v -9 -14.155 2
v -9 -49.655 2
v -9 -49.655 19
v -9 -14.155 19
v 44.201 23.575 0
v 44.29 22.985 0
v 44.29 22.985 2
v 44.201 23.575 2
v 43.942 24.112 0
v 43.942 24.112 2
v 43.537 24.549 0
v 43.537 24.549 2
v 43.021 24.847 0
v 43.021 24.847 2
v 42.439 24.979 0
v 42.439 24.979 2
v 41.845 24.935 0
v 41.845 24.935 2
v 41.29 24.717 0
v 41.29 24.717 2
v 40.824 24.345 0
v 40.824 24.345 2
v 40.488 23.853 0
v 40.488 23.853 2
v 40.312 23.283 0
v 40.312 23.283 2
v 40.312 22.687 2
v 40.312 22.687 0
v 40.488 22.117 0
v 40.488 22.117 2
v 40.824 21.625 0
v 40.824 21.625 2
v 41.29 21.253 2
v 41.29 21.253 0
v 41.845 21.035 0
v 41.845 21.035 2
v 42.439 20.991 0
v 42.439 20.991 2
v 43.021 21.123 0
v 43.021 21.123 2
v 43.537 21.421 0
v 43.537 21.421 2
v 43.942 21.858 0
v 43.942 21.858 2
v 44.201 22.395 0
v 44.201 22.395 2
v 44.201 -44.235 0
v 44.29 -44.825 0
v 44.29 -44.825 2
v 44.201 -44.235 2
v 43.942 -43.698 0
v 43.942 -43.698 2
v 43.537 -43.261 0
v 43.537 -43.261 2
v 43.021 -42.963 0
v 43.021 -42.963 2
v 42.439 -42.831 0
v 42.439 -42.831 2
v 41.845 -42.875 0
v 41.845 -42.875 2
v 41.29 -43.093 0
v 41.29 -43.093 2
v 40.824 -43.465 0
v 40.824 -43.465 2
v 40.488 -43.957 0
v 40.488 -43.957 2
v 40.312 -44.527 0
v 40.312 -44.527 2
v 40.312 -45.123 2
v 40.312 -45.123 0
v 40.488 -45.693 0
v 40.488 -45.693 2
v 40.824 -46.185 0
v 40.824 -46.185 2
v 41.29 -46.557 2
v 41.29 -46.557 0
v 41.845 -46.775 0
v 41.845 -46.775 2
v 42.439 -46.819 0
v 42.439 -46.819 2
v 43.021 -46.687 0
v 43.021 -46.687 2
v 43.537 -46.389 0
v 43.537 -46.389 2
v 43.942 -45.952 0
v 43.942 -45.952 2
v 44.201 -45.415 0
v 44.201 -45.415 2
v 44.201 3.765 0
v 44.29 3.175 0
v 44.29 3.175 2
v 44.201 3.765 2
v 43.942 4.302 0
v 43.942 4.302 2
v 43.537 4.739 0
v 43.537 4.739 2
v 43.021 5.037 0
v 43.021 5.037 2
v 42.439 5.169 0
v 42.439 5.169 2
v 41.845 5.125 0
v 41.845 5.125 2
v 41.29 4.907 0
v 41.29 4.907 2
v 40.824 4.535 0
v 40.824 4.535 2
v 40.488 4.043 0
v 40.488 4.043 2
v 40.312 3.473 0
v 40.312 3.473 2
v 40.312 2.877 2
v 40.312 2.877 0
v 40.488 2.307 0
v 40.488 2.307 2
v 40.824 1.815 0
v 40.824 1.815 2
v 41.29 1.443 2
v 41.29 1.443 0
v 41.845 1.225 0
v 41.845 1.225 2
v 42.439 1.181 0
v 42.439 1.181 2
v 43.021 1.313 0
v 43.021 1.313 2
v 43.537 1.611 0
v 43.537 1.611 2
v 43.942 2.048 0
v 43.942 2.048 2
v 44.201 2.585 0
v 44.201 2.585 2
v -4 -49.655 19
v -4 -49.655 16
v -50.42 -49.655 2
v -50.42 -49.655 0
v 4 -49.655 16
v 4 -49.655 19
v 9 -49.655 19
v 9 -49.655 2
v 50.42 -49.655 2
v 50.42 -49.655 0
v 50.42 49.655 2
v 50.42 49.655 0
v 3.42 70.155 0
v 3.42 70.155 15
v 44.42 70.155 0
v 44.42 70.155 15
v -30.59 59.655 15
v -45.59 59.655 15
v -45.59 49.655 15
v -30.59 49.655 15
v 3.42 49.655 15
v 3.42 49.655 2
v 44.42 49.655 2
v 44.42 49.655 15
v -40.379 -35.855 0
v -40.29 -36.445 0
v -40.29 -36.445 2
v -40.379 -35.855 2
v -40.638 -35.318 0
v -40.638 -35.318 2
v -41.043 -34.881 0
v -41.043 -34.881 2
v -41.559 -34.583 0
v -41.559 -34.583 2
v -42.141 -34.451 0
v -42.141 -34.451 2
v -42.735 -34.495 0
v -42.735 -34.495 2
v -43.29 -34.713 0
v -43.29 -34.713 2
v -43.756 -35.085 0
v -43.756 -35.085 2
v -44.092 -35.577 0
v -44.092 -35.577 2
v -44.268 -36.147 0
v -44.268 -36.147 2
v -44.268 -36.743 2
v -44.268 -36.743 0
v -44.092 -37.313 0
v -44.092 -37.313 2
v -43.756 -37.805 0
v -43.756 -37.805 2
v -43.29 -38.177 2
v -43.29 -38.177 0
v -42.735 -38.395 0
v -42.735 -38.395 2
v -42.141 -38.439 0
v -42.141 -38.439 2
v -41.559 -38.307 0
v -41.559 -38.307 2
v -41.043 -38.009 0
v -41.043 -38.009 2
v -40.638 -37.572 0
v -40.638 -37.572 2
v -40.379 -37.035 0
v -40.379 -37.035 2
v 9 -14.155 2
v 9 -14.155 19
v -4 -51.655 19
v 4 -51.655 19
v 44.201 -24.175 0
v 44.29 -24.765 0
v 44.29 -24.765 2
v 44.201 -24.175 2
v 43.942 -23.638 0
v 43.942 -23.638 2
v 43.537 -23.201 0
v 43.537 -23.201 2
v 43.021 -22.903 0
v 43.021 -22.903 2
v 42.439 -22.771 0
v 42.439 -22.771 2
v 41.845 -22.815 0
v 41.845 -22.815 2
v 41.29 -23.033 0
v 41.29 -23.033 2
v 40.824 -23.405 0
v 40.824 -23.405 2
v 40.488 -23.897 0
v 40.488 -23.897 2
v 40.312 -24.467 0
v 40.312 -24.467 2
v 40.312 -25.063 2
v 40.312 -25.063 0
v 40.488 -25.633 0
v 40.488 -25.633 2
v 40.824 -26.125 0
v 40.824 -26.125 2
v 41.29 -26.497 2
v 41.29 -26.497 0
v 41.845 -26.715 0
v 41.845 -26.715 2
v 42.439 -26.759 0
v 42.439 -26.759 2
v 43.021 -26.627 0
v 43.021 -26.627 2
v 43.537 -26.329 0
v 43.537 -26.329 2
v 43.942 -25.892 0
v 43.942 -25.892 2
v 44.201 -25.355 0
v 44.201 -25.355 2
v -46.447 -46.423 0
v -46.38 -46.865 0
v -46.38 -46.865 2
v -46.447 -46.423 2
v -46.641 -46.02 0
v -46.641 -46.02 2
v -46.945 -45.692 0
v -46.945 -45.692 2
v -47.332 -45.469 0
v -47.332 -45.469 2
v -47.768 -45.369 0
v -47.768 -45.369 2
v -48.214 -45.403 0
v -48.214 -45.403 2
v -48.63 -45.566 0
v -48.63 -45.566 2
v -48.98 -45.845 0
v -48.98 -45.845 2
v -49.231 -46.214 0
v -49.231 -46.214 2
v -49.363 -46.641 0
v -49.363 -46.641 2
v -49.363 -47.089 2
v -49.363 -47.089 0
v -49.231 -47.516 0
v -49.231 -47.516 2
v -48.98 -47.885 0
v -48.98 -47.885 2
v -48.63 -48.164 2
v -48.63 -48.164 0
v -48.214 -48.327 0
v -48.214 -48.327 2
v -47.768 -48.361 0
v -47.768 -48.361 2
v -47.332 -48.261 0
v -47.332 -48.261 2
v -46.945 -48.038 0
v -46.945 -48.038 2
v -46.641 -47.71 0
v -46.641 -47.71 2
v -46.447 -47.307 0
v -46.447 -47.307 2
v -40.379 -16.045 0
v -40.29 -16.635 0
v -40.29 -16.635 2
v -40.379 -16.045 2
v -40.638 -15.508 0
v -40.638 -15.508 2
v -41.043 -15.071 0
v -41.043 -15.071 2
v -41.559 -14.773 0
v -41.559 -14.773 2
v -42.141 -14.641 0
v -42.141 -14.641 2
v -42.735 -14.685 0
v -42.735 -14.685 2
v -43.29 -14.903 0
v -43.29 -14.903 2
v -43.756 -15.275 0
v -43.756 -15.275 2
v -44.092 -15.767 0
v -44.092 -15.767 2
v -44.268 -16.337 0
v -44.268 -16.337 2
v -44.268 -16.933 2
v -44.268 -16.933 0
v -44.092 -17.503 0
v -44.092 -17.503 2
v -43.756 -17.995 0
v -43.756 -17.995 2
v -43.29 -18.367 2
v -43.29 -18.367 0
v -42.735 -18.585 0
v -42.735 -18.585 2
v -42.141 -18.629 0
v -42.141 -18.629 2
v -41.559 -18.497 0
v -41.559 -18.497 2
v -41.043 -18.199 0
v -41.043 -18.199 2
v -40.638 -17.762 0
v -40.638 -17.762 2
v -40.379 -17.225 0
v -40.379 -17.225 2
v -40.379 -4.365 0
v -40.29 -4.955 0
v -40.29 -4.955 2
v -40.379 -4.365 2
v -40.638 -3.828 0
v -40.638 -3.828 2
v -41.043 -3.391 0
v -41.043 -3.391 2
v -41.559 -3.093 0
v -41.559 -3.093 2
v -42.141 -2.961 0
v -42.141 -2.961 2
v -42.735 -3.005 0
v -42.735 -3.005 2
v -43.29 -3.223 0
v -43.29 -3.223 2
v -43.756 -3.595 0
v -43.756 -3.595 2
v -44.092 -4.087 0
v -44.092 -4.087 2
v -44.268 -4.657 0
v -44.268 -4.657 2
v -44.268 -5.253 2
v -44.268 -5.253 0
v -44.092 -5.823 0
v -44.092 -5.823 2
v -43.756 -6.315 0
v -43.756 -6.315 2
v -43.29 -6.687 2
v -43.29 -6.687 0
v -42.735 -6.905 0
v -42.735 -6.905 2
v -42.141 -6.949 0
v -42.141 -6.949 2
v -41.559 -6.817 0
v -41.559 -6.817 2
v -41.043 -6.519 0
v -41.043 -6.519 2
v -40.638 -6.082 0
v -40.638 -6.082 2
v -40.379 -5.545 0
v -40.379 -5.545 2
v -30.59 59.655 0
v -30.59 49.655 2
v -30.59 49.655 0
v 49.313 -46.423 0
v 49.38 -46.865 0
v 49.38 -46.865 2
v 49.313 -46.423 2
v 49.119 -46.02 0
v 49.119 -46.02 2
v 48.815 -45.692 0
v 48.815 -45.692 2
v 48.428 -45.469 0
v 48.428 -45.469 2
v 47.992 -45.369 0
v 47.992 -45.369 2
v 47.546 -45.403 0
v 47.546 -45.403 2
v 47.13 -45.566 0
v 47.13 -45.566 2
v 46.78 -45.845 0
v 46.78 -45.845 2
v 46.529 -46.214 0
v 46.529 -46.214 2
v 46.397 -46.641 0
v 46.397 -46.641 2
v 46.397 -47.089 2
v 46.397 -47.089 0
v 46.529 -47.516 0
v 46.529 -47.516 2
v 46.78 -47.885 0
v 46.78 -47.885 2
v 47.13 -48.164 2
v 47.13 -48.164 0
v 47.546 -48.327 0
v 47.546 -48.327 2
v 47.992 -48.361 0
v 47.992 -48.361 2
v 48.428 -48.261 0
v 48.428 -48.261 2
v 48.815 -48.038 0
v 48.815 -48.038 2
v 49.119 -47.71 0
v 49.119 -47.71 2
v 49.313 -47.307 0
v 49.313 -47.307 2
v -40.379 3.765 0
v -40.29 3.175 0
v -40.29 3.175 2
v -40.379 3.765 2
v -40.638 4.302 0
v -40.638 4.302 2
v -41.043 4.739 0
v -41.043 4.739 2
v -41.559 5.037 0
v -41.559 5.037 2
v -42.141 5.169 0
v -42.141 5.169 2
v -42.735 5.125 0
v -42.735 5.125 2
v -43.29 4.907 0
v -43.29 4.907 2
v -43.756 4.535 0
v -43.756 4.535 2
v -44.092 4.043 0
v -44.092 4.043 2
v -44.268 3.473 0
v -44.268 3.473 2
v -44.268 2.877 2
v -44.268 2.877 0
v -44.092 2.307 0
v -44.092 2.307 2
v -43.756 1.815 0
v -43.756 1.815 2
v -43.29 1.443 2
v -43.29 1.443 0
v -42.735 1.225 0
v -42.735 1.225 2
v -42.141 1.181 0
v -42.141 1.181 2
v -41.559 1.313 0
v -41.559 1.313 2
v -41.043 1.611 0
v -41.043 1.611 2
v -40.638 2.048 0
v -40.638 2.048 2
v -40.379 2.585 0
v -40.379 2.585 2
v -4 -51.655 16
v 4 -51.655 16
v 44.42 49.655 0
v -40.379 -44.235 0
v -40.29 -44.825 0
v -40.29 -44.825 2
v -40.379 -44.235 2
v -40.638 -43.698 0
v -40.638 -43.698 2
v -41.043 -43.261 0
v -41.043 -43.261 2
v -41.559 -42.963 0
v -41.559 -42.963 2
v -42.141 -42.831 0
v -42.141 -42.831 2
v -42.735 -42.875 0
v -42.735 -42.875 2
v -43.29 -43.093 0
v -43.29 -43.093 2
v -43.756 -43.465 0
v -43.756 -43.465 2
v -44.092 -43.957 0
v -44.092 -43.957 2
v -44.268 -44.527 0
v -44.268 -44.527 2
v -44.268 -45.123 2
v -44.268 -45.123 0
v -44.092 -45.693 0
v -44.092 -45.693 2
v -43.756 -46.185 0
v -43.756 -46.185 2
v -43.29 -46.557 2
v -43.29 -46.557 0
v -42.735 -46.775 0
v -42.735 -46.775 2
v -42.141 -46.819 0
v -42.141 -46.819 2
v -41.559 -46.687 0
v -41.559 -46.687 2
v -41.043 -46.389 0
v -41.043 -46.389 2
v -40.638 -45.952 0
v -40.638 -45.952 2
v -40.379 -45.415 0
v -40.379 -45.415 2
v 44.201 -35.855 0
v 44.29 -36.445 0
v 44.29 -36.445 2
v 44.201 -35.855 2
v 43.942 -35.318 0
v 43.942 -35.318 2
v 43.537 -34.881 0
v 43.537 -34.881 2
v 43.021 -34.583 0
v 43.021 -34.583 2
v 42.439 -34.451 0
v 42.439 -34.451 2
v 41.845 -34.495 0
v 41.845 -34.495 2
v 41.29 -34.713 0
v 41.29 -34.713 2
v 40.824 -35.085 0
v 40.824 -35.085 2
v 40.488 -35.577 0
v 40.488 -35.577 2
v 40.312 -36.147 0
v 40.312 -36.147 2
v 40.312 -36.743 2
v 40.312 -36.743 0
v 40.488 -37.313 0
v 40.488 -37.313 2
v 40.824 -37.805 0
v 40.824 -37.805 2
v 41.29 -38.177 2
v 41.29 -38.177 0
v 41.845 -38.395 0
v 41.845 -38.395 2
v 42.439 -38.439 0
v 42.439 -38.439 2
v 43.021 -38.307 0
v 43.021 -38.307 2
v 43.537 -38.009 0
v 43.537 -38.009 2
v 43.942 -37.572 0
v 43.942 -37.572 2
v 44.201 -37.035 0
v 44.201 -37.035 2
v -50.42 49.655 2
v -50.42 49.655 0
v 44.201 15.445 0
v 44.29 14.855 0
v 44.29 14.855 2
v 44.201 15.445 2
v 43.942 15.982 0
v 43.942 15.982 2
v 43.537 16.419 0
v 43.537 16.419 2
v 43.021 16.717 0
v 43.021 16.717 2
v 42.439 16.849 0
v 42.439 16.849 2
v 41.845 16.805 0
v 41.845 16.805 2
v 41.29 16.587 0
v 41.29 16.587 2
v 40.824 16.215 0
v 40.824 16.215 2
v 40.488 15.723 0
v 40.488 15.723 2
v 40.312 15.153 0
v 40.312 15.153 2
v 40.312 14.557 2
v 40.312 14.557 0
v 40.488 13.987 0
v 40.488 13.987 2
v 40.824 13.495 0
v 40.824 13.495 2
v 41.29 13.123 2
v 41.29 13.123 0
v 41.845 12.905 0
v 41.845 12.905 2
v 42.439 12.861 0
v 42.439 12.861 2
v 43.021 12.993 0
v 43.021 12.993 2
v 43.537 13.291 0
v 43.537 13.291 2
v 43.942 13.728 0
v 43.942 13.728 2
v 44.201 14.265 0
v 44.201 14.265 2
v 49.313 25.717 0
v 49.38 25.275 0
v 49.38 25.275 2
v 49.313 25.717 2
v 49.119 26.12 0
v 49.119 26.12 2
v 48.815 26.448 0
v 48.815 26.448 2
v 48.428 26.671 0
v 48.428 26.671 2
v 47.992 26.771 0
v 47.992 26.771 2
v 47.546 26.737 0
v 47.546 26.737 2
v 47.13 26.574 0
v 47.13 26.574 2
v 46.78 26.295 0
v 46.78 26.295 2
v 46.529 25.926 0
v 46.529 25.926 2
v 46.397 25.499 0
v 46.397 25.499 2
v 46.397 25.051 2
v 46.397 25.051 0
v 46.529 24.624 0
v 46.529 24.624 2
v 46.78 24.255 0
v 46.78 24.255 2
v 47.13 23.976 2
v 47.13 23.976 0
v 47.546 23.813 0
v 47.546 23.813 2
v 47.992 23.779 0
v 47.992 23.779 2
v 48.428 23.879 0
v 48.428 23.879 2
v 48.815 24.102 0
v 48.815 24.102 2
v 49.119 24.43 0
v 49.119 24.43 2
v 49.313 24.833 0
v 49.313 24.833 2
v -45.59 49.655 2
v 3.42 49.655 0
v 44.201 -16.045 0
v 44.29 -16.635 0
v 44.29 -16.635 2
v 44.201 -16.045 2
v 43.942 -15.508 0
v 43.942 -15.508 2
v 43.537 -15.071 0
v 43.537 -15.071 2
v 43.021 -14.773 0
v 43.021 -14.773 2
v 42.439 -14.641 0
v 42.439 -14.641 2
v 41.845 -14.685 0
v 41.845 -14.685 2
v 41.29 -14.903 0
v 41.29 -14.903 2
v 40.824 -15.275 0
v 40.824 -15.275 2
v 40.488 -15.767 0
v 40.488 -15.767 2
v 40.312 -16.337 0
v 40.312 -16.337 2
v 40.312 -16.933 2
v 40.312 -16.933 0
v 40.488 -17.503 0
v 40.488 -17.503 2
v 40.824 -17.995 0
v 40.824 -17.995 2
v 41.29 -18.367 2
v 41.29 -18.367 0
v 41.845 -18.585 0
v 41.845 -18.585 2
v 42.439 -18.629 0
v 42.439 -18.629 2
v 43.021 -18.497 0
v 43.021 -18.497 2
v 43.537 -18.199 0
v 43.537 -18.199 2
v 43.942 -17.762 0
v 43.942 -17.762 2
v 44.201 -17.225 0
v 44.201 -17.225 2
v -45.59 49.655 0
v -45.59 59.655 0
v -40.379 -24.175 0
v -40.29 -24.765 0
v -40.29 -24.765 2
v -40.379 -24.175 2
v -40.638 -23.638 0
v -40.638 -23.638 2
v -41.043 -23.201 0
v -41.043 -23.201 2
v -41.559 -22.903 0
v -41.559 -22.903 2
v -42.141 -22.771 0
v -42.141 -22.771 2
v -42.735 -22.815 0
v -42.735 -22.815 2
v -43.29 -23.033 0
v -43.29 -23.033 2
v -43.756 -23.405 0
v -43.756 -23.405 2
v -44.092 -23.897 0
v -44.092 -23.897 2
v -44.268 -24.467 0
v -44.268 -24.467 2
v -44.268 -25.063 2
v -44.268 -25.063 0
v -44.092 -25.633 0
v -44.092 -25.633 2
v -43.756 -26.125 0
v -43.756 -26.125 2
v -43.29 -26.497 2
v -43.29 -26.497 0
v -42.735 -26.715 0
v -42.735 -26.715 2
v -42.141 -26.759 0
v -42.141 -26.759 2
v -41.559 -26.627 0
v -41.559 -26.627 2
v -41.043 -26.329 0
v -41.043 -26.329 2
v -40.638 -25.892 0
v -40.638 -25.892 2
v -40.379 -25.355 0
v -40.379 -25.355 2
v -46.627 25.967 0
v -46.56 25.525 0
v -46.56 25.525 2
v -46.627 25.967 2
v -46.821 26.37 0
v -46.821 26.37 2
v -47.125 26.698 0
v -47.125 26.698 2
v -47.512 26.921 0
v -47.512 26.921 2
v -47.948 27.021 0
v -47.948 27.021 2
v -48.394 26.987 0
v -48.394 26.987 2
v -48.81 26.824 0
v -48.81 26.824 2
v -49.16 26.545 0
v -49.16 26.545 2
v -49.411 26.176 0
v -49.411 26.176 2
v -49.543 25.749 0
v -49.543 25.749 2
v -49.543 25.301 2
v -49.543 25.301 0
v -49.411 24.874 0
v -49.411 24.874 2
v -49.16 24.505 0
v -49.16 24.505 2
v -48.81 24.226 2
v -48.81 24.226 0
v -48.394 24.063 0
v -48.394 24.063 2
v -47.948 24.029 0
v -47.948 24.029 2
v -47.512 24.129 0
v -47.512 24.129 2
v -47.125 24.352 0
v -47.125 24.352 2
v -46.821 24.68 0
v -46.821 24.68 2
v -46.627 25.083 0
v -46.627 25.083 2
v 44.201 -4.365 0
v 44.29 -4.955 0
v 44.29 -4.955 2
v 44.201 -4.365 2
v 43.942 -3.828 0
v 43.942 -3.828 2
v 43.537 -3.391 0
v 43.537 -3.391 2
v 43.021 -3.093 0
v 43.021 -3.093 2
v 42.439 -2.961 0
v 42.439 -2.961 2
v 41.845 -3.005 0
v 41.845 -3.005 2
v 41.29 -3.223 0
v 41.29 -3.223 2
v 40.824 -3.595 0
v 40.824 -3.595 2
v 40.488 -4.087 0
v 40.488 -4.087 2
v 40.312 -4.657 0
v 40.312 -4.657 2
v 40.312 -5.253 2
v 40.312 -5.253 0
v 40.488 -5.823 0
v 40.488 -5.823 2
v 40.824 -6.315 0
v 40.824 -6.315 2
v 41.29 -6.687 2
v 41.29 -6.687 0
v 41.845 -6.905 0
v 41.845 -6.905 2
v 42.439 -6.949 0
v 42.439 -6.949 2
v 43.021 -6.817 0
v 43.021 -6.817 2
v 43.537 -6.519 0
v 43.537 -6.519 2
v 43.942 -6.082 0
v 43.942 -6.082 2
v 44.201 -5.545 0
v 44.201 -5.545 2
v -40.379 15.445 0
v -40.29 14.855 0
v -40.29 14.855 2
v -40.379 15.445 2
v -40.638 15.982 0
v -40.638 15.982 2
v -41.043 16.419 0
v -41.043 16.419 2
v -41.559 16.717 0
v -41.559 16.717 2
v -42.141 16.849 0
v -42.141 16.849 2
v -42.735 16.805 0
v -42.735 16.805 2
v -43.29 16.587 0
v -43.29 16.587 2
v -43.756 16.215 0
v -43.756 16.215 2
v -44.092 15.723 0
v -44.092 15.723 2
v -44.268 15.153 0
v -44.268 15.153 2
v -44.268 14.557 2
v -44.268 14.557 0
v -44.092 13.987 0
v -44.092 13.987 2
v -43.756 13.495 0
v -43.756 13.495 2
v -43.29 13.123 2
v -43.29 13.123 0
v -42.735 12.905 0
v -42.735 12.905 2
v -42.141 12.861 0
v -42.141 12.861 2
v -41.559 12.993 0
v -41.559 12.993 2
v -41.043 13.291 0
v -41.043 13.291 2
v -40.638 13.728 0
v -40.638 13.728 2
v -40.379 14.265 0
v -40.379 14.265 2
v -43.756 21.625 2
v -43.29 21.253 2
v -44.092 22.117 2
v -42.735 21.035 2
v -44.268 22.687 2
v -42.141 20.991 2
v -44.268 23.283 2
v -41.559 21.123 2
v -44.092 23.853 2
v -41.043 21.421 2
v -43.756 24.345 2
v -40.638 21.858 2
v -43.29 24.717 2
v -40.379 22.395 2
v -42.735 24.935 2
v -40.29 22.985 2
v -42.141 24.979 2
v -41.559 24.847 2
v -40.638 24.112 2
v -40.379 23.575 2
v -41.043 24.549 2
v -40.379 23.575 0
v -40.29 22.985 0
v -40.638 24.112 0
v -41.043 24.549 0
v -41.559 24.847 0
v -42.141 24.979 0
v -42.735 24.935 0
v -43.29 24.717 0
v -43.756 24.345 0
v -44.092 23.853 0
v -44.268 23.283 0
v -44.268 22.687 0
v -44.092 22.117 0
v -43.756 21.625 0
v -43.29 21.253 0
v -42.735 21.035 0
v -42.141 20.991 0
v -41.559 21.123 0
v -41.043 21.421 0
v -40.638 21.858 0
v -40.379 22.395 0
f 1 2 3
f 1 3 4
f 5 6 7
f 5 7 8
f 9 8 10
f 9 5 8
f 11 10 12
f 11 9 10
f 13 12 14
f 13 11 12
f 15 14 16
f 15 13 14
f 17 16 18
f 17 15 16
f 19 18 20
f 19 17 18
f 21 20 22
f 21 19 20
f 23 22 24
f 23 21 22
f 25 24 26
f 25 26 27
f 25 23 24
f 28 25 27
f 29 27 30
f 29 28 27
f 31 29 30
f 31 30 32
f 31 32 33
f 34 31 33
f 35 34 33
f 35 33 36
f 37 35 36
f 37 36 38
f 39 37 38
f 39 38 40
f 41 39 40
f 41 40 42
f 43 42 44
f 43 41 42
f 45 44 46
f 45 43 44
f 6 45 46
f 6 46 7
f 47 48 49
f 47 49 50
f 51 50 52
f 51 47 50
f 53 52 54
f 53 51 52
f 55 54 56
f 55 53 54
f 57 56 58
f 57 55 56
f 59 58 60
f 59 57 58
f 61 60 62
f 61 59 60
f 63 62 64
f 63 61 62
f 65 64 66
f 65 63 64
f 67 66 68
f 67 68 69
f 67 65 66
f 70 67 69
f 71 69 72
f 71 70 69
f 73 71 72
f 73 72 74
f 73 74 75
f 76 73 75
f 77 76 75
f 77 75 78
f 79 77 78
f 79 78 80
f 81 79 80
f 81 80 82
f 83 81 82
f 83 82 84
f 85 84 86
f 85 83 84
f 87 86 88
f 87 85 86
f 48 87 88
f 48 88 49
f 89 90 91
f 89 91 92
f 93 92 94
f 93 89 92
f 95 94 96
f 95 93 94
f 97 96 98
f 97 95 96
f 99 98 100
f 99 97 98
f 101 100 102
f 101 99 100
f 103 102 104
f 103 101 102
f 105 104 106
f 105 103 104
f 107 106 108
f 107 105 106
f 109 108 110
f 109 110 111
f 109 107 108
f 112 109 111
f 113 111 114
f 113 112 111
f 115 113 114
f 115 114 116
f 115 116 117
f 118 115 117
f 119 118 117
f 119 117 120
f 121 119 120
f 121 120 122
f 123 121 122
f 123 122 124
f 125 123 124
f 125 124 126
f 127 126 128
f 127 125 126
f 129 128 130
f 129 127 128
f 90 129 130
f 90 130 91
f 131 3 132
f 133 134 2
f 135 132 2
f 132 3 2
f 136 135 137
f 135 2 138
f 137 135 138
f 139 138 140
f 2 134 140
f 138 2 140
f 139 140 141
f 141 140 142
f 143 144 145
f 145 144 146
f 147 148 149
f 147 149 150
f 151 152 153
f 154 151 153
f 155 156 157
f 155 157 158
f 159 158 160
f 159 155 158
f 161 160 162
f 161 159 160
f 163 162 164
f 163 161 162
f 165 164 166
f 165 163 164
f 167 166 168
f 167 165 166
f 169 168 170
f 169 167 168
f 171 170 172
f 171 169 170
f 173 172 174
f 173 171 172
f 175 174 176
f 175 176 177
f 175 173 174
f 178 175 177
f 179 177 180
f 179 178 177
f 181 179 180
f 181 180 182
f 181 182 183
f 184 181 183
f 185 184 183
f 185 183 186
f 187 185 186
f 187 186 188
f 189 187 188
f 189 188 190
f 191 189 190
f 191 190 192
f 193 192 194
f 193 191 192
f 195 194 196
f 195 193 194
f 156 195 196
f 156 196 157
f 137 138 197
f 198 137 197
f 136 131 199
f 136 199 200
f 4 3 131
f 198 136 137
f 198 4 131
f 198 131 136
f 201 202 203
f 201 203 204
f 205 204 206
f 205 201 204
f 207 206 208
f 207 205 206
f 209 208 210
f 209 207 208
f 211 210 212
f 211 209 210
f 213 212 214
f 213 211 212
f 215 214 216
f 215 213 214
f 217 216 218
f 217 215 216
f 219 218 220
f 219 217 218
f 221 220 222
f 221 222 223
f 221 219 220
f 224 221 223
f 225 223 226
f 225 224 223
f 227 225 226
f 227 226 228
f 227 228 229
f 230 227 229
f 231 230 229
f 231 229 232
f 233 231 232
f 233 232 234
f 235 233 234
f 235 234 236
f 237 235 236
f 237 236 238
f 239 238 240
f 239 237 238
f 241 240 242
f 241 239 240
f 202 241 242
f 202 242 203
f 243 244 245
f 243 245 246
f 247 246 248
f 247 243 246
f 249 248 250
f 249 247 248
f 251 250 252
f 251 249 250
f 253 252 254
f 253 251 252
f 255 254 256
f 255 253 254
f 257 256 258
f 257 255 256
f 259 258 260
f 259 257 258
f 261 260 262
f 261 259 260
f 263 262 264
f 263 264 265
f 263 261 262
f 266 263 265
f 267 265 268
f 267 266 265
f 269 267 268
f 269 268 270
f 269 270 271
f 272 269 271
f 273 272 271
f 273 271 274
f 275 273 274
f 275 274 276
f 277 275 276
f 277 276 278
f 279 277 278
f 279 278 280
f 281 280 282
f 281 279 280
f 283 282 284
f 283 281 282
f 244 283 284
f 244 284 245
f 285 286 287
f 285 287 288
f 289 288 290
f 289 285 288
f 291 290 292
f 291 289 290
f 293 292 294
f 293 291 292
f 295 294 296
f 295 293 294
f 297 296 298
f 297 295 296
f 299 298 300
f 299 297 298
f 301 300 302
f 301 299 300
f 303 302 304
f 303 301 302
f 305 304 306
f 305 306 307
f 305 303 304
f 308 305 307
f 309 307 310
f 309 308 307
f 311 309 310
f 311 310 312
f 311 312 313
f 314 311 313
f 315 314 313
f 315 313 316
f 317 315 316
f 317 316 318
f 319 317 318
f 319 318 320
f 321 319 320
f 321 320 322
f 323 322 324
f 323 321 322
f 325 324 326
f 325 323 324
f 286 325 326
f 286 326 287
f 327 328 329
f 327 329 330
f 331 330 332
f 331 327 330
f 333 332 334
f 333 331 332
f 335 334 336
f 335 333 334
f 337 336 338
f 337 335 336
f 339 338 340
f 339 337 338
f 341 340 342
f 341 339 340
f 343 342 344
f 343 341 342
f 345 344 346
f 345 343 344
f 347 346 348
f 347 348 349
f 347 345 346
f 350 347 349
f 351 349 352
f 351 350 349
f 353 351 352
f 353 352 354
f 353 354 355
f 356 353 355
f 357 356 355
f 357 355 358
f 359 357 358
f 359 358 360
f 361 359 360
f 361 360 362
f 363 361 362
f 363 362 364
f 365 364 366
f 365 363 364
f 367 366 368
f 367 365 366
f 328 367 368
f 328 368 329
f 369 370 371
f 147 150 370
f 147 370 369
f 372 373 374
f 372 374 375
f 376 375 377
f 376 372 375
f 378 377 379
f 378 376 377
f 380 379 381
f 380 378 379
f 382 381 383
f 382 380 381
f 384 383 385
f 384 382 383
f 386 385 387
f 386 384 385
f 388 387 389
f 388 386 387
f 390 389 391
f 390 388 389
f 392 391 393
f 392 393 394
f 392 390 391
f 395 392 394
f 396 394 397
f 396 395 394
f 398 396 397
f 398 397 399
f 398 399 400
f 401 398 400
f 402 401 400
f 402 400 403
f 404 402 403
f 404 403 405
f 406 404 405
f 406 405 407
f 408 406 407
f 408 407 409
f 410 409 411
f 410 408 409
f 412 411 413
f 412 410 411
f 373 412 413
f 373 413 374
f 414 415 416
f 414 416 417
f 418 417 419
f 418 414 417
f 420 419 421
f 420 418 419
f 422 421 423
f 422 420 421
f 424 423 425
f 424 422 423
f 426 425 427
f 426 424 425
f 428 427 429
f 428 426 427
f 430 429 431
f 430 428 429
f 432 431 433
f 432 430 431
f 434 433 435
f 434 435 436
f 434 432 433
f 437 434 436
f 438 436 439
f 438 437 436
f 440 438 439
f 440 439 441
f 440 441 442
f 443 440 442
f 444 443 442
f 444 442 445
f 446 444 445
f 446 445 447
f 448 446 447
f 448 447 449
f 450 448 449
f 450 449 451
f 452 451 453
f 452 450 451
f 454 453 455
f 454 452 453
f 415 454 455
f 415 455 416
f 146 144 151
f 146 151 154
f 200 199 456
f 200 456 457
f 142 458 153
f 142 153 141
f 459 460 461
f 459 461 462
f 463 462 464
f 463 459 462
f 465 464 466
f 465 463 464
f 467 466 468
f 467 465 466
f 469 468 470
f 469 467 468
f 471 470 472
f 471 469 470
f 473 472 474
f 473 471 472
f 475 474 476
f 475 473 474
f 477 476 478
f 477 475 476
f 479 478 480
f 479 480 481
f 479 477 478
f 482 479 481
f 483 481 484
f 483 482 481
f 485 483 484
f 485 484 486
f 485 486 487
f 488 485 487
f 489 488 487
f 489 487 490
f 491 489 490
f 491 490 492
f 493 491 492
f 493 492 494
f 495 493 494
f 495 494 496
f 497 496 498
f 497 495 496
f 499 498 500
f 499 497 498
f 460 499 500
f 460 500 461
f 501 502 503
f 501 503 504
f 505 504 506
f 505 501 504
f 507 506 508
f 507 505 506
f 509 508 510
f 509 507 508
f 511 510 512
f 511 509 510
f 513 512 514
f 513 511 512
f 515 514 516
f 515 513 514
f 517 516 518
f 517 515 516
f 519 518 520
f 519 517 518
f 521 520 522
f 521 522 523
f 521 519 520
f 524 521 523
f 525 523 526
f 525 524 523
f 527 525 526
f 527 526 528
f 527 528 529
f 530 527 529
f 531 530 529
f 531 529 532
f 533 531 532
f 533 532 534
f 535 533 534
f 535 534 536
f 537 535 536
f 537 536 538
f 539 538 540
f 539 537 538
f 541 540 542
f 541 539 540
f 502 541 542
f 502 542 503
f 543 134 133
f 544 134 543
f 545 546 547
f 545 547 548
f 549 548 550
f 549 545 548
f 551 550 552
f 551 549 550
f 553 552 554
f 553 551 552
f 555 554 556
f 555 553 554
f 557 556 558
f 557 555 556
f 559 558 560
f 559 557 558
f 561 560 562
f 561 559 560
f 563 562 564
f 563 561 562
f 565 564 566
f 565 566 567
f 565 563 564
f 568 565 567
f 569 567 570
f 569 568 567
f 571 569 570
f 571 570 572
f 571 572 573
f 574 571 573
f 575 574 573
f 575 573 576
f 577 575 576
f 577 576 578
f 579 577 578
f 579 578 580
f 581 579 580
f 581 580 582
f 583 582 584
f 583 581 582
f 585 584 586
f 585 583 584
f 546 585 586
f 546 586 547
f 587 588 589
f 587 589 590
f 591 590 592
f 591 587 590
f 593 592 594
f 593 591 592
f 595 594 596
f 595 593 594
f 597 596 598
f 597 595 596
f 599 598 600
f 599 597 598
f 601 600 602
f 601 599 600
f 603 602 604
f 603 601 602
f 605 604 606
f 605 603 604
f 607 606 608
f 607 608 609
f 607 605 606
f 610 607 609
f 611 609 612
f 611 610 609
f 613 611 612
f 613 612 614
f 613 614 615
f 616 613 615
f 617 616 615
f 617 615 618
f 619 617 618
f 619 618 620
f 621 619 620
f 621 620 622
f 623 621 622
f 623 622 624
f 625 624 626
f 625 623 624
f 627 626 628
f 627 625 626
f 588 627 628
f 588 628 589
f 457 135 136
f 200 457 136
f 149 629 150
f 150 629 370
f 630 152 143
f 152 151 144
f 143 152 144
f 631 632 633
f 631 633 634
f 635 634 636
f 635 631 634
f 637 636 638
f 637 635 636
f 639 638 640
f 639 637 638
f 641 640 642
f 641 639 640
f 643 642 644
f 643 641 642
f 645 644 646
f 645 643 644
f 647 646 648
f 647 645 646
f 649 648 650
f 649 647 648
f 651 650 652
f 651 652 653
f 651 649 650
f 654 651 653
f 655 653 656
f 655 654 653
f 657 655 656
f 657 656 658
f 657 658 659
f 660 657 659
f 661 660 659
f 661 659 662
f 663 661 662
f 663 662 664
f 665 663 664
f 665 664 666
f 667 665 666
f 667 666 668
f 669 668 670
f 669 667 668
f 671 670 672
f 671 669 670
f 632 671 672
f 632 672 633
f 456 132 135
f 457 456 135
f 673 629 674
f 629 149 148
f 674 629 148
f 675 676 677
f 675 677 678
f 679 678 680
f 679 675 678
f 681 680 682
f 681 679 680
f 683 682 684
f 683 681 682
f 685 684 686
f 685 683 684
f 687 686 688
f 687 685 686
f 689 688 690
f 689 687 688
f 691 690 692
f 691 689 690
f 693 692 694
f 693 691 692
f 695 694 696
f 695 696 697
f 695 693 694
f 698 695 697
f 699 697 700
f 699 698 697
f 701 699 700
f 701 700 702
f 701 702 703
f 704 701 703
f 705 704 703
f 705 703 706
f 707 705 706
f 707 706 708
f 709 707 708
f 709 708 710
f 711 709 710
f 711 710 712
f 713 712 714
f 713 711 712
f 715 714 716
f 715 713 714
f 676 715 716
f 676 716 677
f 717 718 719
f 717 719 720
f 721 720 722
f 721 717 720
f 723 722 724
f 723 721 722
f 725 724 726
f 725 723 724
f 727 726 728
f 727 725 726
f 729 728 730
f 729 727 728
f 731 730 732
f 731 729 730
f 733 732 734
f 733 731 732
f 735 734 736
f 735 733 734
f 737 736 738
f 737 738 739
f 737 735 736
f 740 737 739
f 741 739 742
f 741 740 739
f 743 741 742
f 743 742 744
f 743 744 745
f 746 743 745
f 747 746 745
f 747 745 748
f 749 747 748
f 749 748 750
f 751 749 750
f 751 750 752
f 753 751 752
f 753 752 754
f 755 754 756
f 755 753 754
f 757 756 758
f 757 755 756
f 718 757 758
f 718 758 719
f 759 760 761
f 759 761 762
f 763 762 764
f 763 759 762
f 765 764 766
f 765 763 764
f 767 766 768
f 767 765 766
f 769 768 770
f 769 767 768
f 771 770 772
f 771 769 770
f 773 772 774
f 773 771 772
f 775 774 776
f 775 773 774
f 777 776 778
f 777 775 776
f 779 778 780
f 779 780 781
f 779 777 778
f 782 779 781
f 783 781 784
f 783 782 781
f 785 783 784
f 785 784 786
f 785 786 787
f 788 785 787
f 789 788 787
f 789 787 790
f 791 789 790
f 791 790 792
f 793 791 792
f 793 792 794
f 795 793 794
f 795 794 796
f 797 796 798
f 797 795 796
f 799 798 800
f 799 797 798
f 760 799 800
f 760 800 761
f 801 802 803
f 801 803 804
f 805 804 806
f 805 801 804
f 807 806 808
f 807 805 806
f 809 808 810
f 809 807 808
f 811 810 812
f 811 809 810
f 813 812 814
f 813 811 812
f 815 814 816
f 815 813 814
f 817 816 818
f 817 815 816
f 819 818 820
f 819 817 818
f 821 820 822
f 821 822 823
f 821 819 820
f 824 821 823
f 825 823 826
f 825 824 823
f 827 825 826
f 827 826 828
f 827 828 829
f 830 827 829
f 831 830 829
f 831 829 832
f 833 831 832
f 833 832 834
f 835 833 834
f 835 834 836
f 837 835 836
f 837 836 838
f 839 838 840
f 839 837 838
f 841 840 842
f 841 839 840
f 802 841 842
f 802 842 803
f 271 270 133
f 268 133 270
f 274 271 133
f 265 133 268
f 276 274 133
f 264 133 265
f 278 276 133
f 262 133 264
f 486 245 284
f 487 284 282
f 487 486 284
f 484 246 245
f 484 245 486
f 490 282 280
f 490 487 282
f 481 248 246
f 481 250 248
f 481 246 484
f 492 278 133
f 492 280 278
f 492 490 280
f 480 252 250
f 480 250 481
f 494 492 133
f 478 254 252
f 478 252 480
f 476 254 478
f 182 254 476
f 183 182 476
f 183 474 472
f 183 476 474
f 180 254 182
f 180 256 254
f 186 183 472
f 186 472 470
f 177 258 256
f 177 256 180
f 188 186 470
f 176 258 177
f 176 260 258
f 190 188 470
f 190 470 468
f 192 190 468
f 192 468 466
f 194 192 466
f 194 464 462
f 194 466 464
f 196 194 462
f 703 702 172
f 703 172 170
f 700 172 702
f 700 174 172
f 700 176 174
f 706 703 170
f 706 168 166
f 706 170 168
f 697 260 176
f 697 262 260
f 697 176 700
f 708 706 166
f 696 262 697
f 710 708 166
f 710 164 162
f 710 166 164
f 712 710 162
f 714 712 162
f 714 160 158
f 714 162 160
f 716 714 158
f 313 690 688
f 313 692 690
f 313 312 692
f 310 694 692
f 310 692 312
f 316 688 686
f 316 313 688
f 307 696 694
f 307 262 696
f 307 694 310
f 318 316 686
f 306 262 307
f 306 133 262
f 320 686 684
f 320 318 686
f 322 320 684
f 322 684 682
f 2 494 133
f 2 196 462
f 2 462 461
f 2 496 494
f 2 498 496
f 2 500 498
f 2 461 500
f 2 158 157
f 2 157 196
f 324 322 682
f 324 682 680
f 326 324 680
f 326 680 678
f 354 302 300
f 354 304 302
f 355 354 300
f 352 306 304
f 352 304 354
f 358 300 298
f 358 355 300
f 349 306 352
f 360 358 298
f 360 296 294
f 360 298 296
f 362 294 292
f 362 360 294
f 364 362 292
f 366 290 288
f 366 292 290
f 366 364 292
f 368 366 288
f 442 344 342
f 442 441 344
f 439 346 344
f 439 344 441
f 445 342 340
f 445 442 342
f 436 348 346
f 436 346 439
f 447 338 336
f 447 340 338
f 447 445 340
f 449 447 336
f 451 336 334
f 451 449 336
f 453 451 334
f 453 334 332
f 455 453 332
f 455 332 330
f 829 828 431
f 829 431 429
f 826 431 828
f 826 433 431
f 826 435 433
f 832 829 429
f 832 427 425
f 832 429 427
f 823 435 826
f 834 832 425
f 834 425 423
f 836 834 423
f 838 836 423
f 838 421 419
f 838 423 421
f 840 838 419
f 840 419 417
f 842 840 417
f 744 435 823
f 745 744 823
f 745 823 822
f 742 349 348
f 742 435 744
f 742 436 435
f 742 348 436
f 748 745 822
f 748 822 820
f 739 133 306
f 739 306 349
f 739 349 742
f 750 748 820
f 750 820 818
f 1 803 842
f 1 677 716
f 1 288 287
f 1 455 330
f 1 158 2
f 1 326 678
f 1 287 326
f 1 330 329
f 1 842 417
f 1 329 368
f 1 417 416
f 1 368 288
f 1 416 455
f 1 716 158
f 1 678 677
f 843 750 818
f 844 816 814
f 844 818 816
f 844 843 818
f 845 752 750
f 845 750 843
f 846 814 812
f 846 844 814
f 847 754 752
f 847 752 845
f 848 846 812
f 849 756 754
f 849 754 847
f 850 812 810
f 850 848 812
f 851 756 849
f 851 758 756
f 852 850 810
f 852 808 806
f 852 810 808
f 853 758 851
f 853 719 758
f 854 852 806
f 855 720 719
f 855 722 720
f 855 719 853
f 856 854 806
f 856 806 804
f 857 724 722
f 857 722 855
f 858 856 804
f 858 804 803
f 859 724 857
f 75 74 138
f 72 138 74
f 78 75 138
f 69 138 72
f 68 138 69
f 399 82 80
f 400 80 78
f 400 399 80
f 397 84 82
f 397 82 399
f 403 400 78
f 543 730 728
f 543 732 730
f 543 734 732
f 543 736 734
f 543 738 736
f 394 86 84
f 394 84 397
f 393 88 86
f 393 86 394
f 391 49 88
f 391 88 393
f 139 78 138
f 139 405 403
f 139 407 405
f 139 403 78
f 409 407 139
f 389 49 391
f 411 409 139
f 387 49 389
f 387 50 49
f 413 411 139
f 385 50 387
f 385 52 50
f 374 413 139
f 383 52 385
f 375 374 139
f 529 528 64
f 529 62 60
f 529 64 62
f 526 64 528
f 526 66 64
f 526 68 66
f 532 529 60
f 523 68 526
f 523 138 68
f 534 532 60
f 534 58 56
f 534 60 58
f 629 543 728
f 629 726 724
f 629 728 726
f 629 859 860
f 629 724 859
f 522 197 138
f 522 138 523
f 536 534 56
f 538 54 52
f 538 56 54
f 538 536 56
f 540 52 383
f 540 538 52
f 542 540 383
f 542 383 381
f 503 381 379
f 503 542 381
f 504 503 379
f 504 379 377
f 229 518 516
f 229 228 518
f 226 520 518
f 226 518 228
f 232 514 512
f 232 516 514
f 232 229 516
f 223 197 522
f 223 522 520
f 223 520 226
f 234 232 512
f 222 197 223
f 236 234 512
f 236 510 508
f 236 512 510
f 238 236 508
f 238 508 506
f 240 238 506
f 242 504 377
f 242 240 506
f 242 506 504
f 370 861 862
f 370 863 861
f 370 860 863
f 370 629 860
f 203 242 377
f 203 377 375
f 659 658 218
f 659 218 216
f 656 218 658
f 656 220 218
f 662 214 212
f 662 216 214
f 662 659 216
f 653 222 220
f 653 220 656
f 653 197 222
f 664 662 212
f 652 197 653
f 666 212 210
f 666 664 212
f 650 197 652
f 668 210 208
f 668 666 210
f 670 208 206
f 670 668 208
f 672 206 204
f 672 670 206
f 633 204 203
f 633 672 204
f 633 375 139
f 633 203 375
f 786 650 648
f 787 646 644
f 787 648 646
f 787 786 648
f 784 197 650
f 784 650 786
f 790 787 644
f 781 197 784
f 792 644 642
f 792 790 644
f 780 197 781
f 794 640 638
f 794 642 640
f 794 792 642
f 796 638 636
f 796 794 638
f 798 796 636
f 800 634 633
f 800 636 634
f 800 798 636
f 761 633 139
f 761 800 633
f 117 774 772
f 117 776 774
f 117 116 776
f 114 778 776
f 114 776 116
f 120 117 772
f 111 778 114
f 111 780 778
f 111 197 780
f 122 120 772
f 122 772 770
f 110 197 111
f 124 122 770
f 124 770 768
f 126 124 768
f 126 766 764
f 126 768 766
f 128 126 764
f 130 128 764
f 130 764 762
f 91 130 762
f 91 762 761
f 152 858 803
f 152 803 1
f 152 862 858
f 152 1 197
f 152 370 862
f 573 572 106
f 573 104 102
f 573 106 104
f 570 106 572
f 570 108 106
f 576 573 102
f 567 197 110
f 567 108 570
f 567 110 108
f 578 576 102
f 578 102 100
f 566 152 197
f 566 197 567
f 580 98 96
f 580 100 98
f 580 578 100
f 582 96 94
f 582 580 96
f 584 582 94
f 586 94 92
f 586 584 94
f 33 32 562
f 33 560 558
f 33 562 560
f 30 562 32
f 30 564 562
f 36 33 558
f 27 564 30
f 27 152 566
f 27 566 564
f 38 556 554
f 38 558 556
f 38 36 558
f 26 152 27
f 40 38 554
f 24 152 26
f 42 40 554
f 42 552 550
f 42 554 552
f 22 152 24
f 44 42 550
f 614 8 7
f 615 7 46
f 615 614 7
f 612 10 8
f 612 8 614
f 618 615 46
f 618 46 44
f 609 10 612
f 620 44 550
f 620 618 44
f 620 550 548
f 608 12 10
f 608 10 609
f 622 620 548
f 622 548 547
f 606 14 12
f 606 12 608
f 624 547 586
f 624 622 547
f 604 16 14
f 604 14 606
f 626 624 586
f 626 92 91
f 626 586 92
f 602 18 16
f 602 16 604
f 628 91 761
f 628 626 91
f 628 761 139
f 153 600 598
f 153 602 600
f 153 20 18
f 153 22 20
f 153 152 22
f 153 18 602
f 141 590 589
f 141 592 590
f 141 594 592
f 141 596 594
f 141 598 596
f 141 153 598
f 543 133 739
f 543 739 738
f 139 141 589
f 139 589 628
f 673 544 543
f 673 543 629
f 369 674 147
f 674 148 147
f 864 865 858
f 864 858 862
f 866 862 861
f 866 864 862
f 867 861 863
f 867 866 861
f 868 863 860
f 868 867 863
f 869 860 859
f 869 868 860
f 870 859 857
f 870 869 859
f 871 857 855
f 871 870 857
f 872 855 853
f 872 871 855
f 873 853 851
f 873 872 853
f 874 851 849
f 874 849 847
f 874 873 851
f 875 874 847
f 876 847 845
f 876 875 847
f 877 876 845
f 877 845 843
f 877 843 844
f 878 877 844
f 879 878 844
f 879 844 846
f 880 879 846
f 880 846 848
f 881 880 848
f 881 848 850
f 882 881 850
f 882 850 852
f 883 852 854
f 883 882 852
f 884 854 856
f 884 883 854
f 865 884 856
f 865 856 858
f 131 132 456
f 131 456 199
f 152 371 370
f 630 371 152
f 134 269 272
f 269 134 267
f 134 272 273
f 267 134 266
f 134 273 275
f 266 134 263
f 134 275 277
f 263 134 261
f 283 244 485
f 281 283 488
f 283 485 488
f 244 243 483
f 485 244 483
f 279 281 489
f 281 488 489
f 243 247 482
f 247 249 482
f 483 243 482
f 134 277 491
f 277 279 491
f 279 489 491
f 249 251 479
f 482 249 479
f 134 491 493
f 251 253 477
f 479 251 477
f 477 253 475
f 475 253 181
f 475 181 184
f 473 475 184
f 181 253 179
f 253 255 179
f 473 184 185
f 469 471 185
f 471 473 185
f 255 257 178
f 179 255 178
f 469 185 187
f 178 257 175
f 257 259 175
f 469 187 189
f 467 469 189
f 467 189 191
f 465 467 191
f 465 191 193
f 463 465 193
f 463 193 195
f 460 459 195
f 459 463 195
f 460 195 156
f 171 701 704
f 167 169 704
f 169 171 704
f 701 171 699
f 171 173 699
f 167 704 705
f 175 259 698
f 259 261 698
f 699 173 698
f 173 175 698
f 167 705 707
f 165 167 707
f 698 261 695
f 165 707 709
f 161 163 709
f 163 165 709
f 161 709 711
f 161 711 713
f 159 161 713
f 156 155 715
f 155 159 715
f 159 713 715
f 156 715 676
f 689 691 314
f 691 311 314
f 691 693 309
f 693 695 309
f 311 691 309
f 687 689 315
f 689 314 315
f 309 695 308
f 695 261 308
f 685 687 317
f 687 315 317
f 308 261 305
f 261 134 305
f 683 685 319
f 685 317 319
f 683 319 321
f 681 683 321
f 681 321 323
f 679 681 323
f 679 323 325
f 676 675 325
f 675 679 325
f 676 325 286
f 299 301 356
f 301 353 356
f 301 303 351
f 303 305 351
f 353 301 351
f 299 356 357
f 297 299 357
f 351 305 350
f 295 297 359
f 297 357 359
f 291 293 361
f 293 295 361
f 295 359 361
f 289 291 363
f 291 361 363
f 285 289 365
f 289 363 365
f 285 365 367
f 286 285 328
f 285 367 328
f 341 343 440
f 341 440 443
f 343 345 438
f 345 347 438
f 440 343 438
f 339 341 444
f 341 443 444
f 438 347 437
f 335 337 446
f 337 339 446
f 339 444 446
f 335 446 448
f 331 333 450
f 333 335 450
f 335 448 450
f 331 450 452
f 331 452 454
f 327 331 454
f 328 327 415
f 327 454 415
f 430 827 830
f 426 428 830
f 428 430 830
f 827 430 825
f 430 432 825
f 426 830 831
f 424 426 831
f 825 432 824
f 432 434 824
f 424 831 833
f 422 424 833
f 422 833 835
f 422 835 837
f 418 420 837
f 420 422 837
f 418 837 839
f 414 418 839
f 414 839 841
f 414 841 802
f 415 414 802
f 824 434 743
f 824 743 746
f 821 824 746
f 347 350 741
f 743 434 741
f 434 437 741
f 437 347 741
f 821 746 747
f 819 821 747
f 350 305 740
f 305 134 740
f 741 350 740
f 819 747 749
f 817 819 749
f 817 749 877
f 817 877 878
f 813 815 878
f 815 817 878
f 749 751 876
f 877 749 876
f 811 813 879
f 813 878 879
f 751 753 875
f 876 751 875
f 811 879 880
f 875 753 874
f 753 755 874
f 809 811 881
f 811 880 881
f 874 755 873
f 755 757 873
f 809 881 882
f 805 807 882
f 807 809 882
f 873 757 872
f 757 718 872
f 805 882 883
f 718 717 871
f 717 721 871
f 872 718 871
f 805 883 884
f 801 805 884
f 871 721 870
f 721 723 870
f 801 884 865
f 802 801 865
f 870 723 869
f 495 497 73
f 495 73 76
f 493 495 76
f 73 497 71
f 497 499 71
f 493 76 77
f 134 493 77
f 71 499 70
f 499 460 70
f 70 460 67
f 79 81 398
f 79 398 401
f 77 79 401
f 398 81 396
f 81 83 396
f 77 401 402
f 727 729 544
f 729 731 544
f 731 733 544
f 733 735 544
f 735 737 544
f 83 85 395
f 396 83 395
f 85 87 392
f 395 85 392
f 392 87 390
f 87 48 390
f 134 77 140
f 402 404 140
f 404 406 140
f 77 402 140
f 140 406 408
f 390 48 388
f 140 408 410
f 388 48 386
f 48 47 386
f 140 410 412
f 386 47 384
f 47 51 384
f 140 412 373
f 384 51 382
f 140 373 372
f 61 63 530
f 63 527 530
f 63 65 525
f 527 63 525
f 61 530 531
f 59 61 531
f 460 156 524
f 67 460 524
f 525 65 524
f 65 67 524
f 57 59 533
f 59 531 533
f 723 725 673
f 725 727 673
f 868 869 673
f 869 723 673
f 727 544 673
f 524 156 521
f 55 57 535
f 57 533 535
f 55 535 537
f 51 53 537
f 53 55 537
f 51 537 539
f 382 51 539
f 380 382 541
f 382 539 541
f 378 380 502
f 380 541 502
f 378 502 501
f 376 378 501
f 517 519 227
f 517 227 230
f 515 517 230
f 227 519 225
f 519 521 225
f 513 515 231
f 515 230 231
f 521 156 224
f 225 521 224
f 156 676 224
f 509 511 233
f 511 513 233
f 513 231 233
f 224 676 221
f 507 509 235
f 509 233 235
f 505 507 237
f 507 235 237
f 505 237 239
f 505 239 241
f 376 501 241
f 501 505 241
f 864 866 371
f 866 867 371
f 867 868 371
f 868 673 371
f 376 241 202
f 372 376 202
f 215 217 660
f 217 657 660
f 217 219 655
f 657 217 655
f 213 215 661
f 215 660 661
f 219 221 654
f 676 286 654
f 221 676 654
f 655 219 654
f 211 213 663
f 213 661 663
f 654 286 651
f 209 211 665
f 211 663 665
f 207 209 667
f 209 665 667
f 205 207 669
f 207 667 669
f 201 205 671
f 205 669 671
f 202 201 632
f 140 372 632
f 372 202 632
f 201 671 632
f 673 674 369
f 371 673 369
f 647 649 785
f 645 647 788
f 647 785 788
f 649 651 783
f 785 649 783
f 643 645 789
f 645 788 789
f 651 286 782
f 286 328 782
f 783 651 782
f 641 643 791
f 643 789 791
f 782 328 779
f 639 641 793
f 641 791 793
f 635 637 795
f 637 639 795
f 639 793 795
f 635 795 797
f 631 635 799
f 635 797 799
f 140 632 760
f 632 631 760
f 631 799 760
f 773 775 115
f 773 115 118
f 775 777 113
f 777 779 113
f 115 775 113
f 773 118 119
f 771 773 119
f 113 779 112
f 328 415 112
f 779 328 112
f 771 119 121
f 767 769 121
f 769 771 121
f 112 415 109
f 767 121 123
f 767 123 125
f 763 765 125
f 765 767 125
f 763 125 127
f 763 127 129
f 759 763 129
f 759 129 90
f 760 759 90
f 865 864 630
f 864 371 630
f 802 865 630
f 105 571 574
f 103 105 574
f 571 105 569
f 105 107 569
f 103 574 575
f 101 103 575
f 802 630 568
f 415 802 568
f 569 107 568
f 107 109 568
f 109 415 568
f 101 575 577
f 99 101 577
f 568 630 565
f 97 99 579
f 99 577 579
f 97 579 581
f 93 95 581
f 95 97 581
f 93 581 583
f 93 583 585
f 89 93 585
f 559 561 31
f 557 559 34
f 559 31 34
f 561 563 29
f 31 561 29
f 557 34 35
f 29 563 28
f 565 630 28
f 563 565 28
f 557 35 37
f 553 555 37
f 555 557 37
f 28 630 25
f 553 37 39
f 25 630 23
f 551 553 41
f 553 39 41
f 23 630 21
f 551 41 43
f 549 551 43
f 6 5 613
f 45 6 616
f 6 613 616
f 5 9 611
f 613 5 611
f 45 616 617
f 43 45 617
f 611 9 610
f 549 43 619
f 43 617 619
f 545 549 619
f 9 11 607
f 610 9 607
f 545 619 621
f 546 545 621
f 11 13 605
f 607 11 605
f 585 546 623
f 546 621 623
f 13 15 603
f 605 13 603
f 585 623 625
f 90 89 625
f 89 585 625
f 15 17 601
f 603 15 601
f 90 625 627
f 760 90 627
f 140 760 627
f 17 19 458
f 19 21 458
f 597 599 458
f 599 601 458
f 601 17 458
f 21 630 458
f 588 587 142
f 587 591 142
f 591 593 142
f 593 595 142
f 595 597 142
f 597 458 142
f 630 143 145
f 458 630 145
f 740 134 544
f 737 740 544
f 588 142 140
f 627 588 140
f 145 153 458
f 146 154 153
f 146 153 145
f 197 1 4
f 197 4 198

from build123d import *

# Parameters (mm, degrees)
F0_W          = 100.84
F0_H          = 99.31
F0_R          = 1.5
F0_R_2        = 2
F1_DEPTH      = 2
F3_W          = 15
F3_H          = 10
F3_W_2        = 41
F3_H_2        = 20.5
F4_DEPTH      = 13
F4_DEPTH_BACK = 2
F5_W          = 18
F5_H          = 35.5
F6_DEPTH      = 17
F8_W          = 8
F8_H          = 3
F9_DEPTH      = 2


with BuildPart() as f1:
    # F0 (on Top) → F1 (new body)
    with BuildSketch(Plane.XY):
        Rectangle(F0_W, F0_H)
        with Locations((-47.88, -46.865)):
            Circle(F0_R, mode=Mode.SUBTRACT)
        with Locations((-42.29, -44.825)):
            Circle(F0_R_2, mode=Mode.SUBTRACT)
        with Locations((-42.29, -36.445)):
            Circle(F0_R_2, mode=Mode.SUBTRACT)
        with Locations((-42.29, -24.765)):
            Circle(F0_R_2, mode=Mode.SUBTRACT)
        with Locations((-42.29, -16.635)):
            Circle(F0_R_2, mode=Mode.SUBTRACT)
        with Locations((-42.29, -4.955)):
            Circle(F0_R_2, mode=Mode.SUBTRACT)
        with Locations((42.29, -44.825)):
            Circle(F0_R_2, mode=Mode.SUBTRACT)
        with Locations((47.88, -46.865)):
            Circle(F0_R, mode=Mode.SUBTRACT)
        with Locations((42.29, -36.445)):
            Circle(F0_R_2, mode=Mode.SUBTRACT)
        with Locations((42.29, -24.765)):
            Circle(F0_R_2, mode=Mode.SUBTRACT)
        with Locations((42.29, -16.635)):
            Circle(F0_R_2, mode=Mode.SUBTRACT)
        with Locations((42.29, -4.955)):
            Circle(F0_R_2, mode=Mode.SUBTRACT)
        with Locations((-42.29, 3.175)):
            Circle(F0_R_2, mode=Mode.SUBTRACT)
        with Locations((-42.29, 14.855)):
            Circle(F0_R_2, mode=Mode.SUBTRACT)
        with Locations((-42.29, 22.985)):
            Circle(F0_R_2, mode=Mode.SUBTRACT)
        with Locations((-48.06, 25.525)):
            Circle(F0_R, mode=Mode.SUBTRACT)
        with Locations((42.29, 3.175)):
            Circle(F0_R_2, mode=Mode.SUBTRACT)
        with Locations((42.29, 14.855)):
            Circle(F0_R_2, mode=Mode.SUBTRACT)
        with Locations((42.29, 22.985)):
            Circle(F0_R_2, mode=Mode.SUBTRACT)
        with Locations((47.88, 25.275)):
            Circle(F0_R, mode=Mode.SUBTRACT)
    extrude(amount=F1_DEPTH)

    # F3 (on offset) → F4 (join, two sides)
    with BuildSketch(Plane.XY.offset(2)) as f4_sk:
        with Locations((-38.09, 54.655)):
            Rectangle(F3_W, F3_H)
        with Locations((23.92, 59.905)):
            Rectangle(F3_W_2, F3_H_2)
    extrude(amount=F4_DEPTH)
    extrude(f4_sk.sketch, amount=-F4_DEPTH_BACK)

    # F5 (on offset) → F6 (join)
    with BuildSketch(Plane.XY.offset(2)):
        with Locations((0, -31.905)):
            Rectangle(F5_W, F5_H)
    extrude(amount=F6_DEPTH)

    # F8 (on offset) → F9 (join)
    with BuildSketch(Plane.XZ.offset(49.655)):
        with Locations((0, 17.5)):
            Rectangle(F8_W, F8_H)
    extrude(amount=F9_DEPTH)


solid = f1.part
